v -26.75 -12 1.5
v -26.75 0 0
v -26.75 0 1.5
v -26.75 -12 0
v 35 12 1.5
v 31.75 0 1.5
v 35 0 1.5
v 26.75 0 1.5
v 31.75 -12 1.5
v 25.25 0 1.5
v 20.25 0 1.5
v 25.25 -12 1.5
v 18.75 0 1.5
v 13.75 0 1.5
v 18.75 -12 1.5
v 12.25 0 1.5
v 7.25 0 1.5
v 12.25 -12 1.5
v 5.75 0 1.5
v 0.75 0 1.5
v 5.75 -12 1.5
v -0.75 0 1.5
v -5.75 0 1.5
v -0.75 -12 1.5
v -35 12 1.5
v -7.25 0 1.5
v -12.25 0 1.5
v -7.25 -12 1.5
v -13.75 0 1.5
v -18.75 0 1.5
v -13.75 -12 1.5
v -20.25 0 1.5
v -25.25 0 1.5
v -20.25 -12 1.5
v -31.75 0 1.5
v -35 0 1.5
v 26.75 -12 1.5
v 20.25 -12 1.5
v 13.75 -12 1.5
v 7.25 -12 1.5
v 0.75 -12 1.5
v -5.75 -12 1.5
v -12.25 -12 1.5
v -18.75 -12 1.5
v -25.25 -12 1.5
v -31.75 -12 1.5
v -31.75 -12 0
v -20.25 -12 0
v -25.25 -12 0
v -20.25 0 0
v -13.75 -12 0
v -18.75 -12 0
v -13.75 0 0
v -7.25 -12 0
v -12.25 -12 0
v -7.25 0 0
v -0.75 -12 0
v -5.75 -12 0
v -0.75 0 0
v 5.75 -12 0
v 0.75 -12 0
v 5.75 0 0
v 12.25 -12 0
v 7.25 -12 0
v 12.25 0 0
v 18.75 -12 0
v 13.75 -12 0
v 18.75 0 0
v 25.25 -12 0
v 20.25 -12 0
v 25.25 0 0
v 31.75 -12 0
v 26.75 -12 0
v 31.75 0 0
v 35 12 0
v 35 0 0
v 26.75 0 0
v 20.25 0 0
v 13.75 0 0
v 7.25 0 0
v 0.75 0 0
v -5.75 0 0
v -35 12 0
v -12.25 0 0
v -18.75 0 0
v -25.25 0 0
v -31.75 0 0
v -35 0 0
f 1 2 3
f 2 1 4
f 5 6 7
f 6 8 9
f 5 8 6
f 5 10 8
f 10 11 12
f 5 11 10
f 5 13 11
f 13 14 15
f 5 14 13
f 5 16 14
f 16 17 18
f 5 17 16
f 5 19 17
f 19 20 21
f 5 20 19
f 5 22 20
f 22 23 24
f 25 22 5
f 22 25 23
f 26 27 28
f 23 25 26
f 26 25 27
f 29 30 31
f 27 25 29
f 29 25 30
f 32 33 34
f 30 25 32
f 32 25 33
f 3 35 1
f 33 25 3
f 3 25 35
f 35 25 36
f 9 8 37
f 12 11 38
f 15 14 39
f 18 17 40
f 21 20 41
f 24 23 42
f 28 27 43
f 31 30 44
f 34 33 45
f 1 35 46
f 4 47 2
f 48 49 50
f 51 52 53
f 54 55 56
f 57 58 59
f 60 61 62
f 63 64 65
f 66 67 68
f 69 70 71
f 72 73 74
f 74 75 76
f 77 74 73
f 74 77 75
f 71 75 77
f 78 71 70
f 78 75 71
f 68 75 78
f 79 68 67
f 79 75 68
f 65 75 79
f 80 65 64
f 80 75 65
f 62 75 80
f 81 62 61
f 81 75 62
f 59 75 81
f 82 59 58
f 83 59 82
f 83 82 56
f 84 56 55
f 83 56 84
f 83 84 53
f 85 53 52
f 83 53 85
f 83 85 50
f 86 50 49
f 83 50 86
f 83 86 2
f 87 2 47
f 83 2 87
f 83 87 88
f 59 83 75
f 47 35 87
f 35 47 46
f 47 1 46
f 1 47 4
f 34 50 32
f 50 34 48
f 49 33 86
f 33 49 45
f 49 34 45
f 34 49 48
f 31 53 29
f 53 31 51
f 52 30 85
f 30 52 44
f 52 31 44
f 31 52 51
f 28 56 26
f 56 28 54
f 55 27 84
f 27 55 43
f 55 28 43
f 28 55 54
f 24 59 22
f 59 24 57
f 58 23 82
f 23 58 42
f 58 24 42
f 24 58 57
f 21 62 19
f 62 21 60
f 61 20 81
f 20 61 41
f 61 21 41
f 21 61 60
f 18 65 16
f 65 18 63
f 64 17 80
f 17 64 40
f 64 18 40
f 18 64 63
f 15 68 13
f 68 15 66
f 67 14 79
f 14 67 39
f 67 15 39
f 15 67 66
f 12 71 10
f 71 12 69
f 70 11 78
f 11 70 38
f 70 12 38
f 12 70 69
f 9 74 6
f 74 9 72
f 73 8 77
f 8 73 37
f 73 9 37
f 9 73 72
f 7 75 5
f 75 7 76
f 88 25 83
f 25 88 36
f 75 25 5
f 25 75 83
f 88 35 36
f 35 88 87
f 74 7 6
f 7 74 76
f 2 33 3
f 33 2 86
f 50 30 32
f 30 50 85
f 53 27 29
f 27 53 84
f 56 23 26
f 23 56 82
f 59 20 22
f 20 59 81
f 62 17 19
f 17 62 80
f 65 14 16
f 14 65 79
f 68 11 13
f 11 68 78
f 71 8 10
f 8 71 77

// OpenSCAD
// 10-well agarose gel comb - printed flat on the bed
// Units: mm

$fn = 64;

// ---- Parameters ----
plate_t      = 1.5;   // plate thickness (Z)
spine_len    = 70;    // spine length (X)
spine_w      = 12;    // spine width (Y)
n_teeth      = 10;    // number of teeth / wells
tooth_w      = 5.0;   // tooth width (X)
tooth_len    = 12;    // tooth length (Y), hanging in -Y
tooth_gap    = 1.5;   // gap between neighbouring teeth (X)
overlap      = 0.01;  // small overlap so teeth fuse into spine

// ---- Derived ----
row_w   = n_teeth * tooth_w + (n_teeth - 1) * tooth_gap; // total width of tooth row
total_y = spine_w + tooth_len;                          // overall Y extent
y0      = -total_y / 2;                                  // tooth tips (centred in Y)
spine_y = y0 + tooth_len;                                // spine lower edge

// ---- Model ----
union() {
    // Spine (back bar)
    translate([-spine_len / 2, spine_y, 0])
        cube([spine_len, spine_w, plate_t]);

    // Teeth
    for (i = [0 : n_teeth - 1])
        translate([-row_w / 2 + i * (tooth_w + tooth_gap), y0, 0])
            cube([tooth_w, tooth_len + overlap, plate_t]);
}
